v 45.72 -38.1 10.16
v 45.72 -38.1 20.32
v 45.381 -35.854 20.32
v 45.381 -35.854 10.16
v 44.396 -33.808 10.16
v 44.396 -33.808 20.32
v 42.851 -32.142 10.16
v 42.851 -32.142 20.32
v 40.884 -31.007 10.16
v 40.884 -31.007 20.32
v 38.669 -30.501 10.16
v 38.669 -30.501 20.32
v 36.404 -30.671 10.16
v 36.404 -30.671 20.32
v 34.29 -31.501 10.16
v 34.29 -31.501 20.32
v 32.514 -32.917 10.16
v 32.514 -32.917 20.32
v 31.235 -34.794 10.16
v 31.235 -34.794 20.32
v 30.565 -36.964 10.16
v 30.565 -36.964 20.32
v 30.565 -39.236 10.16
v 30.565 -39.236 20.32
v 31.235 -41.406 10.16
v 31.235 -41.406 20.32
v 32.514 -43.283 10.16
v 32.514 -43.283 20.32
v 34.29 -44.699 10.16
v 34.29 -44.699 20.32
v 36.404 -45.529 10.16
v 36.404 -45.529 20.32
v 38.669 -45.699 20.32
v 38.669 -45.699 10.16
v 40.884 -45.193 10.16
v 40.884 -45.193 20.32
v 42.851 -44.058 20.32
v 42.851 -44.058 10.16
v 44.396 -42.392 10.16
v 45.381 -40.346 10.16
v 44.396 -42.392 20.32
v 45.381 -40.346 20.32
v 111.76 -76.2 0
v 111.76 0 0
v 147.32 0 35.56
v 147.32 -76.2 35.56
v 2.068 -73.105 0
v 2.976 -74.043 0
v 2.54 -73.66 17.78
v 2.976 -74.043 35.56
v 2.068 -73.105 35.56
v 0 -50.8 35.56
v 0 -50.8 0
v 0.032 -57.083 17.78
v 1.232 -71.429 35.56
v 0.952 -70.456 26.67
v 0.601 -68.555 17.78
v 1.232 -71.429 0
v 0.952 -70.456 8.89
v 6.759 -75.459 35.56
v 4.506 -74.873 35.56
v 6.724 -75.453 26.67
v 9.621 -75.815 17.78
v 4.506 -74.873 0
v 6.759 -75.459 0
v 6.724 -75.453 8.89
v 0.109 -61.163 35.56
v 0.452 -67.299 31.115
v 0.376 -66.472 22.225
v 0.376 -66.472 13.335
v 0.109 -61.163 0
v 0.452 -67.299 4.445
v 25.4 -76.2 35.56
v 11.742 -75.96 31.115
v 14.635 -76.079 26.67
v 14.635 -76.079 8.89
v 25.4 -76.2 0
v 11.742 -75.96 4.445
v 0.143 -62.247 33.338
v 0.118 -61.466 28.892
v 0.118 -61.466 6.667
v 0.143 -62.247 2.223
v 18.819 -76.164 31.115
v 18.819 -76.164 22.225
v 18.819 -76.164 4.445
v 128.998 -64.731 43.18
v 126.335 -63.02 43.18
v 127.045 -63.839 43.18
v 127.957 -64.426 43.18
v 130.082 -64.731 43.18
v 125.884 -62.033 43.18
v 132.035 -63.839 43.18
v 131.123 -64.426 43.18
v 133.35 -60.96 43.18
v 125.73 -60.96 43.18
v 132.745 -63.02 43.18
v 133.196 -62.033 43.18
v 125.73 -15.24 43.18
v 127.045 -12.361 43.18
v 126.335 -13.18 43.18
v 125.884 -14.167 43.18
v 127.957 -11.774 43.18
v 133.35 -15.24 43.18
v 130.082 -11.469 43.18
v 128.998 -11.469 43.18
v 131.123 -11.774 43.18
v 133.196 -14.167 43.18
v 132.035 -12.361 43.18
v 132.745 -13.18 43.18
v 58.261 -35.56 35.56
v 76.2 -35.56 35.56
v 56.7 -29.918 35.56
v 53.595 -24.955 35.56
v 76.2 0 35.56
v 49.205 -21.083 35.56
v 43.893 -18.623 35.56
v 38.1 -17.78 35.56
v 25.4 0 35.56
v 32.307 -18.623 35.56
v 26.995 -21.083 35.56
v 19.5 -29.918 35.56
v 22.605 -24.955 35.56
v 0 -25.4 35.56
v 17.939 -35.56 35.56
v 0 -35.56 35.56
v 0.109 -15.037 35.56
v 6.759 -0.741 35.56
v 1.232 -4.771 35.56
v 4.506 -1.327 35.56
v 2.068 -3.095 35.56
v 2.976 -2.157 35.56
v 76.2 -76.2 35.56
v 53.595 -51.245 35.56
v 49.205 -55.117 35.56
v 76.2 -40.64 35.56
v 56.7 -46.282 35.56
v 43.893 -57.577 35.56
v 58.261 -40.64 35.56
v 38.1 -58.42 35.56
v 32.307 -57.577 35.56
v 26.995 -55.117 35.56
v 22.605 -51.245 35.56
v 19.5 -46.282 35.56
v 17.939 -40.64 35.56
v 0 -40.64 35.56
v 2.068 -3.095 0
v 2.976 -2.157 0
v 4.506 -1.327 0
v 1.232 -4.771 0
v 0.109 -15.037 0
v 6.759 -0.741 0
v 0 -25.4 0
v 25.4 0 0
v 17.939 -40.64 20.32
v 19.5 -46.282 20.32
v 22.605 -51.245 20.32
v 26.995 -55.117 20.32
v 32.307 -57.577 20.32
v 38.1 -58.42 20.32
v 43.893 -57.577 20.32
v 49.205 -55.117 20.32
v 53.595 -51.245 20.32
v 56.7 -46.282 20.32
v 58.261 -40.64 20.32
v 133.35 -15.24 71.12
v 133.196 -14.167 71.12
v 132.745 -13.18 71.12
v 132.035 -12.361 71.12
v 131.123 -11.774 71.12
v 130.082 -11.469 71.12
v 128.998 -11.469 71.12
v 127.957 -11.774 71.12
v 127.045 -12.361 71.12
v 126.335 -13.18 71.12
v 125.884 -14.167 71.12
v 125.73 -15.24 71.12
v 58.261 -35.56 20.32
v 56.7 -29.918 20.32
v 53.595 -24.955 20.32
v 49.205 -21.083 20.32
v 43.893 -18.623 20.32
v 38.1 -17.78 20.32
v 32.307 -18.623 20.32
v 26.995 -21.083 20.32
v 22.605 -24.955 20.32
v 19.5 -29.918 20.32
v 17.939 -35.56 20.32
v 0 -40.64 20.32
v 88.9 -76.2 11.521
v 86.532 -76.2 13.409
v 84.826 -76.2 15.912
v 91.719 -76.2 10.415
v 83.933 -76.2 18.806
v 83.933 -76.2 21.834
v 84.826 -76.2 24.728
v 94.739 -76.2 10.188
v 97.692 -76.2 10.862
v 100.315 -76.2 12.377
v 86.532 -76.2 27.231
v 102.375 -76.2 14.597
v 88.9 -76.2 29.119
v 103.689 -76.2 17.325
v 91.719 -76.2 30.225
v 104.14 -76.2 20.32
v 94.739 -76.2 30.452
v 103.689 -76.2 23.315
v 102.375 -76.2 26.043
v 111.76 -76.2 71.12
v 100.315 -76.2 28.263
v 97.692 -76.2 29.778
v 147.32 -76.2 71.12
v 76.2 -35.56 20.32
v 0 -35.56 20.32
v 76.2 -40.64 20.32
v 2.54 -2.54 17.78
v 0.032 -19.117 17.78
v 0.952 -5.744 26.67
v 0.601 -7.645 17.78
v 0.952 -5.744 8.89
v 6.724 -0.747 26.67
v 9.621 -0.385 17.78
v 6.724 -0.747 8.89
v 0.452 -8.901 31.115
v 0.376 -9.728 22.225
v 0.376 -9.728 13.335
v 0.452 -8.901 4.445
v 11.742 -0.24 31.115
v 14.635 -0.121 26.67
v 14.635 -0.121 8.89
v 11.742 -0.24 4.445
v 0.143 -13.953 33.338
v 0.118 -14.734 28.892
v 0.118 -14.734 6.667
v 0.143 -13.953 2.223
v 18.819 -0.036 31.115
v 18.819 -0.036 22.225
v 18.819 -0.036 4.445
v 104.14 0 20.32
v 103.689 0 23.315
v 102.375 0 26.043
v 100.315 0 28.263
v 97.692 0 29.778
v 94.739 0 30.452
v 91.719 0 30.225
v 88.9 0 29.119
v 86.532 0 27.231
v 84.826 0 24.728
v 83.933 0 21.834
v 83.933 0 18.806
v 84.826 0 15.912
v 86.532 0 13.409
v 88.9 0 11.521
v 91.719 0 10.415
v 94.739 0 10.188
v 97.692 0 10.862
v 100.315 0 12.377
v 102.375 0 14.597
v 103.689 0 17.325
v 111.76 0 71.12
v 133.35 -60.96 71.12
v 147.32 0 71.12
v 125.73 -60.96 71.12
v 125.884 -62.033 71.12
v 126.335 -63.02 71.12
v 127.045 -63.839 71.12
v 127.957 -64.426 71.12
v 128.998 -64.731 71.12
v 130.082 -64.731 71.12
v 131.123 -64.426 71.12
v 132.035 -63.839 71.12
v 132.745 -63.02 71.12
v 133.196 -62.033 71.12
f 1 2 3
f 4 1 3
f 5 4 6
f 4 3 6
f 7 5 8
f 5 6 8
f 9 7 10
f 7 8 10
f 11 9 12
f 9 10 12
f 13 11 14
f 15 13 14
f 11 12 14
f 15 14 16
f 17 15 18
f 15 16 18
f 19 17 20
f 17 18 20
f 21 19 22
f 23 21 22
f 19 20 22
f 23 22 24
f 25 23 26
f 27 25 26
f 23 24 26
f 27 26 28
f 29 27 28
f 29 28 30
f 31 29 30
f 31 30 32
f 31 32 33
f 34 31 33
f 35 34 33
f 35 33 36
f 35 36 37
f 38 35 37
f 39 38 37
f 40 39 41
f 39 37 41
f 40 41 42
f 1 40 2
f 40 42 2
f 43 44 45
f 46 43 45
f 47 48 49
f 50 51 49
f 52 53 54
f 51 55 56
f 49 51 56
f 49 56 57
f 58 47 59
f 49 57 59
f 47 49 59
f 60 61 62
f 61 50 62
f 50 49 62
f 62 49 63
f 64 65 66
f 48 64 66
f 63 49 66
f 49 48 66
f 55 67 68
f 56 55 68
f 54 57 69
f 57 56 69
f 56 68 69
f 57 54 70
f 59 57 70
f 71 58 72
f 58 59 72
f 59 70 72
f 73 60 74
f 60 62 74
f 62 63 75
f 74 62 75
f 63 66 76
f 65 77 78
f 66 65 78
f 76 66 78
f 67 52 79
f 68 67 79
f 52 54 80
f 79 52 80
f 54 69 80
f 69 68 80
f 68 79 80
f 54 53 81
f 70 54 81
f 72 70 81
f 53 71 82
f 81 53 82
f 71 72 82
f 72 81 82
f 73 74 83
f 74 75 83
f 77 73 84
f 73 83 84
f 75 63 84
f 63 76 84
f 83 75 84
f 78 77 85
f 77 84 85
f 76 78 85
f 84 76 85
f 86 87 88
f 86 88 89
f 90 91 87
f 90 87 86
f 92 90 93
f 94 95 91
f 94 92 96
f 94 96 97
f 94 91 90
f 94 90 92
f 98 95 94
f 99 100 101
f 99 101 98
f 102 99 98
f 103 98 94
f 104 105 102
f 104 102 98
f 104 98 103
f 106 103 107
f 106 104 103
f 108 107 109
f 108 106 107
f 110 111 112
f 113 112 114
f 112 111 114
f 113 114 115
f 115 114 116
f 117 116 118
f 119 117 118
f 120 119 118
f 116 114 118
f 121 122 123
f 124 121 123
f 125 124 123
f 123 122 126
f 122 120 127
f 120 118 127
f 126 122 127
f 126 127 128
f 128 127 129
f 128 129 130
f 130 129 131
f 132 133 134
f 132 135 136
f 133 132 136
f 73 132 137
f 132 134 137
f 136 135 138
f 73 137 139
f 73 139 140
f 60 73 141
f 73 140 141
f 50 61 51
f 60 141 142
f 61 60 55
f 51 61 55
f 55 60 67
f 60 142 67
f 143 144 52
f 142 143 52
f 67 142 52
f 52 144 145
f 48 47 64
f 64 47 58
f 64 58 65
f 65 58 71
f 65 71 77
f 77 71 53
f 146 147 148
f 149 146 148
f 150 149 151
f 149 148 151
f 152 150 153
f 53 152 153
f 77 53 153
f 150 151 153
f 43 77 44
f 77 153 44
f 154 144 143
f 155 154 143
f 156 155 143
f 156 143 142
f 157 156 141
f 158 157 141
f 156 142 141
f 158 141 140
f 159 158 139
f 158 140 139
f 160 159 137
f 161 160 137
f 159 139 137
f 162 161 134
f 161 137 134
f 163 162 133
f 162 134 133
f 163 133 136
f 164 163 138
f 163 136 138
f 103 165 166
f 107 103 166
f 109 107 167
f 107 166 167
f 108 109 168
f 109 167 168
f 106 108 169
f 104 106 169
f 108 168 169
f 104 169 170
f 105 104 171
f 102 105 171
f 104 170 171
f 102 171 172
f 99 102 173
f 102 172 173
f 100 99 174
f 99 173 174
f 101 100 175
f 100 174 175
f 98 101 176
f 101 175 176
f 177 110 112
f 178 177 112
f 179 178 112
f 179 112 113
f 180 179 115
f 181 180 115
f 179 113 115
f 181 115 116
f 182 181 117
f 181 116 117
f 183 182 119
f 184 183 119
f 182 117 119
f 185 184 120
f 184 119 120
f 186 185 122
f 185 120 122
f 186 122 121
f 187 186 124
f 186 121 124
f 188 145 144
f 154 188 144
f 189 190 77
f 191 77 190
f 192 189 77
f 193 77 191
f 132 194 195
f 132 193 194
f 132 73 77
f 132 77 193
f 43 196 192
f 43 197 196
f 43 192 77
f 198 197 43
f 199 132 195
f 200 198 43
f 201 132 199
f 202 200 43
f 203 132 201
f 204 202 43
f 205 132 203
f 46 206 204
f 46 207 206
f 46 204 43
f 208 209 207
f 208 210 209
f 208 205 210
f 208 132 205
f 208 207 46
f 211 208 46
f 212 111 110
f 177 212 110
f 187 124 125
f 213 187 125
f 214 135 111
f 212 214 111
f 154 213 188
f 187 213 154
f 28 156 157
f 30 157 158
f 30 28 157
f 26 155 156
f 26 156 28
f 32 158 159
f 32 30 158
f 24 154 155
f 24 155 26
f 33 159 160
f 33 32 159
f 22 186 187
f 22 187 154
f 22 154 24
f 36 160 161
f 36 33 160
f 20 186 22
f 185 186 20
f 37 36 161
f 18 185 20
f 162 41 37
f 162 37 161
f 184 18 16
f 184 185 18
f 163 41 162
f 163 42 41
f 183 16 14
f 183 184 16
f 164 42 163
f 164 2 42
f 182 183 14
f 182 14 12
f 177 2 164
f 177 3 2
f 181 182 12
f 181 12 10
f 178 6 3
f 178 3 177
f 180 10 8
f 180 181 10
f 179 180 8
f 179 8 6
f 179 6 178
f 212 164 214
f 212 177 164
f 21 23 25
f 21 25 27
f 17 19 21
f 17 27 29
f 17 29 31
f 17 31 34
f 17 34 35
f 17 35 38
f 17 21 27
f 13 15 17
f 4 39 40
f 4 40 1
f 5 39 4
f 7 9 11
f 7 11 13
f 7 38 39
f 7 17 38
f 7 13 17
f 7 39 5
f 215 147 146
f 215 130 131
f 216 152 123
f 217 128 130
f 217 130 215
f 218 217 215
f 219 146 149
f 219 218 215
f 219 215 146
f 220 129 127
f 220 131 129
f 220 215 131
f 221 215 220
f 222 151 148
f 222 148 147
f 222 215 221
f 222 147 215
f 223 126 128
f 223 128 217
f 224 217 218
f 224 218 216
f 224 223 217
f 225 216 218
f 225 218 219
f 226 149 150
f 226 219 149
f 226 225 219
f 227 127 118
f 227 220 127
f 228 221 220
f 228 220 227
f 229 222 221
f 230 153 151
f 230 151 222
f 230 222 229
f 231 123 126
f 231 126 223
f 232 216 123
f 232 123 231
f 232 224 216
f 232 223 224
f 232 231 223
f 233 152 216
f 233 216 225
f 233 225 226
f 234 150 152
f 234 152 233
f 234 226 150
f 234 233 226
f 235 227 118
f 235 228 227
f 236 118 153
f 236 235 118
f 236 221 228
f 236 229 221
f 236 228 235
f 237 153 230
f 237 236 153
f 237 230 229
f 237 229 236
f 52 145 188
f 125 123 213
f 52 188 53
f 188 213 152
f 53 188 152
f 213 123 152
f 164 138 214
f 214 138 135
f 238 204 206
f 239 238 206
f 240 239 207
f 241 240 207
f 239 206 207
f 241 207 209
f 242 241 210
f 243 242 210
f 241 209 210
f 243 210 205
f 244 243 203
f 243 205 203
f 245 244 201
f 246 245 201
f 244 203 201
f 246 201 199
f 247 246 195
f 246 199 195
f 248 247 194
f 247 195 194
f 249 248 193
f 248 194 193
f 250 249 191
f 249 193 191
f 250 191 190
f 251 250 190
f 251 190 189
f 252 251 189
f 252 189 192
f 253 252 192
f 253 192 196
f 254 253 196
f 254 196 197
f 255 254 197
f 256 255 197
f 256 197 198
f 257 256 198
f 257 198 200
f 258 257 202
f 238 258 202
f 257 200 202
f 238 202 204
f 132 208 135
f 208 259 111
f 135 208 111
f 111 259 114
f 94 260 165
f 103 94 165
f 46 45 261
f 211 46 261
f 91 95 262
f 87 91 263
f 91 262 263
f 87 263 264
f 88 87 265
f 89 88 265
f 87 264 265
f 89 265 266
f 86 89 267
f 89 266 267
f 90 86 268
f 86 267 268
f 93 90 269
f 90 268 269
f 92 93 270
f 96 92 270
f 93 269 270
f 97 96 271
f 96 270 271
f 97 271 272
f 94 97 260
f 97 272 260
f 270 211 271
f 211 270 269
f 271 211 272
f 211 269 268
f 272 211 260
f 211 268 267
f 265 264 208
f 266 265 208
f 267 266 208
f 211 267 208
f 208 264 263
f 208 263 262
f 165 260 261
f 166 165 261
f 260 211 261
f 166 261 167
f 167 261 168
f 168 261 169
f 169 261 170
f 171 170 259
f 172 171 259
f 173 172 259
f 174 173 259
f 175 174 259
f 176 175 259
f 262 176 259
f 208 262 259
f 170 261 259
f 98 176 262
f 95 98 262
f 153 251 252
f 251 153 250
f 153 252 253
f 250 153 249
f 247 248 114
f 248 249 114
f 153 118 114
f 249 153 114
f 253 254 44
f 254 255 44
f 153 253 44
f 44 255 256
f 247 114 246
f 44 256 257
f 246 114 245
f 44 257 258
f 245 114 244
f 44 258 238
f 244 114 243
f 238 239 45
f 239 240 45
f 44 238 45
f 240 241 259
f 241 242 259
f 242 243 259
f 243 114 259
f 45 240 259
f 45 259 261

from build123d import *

# Parameters (mm, degrees)
F1_DEPTH     = 76.2
F2_R         = 10.16
F3_DEPTH     = 76.2
F5_DEPTH     = 27.94
F7_DEPTH     = 15.24
F8_R         = 7.62
F9_DEPTH     = 10.16
F10_T1_DEPTH = 162.56
F11_T1_DEPTH = 162.56


# Not quite as in the source:
# - a fillet or chamfer that OpenCascade refuses, or shapes differently, is made with other operations: its cross-section is extruded or revolved along the edge and cut away or added


with BuildPart() as f1:
    # F0 (on Front) → F1 (new body)
    with BuildSketch(Plane.XZ):
        Polygon((0, 35.56), (0, 0), (111.76, 0), (147.32, 35.56), (147.32, 71.12), (111.76, 71.12), (76.2, 35.56), align=None)
    extrude(amount=F1_DEPTH)

    # F2 (on face) → F3 (cut)
    with BuildSketch(Plane.XZ.offset(76.2)):
        with Locations((93.98, 20.32)):
            Circle(F2_R)
    extrude(amount=-F3_DEPTH, mode=Mode.SUBTRACT)

    # F4 (on face) → F5 (cut)
    with BuildSketch(Plane.XY.offset(71.12)):
        with BuildLine():
            ThreePointArc((133.35, -15.24), (129.54, -11.43), (125.73, -15.24))
            Line((125.73, -15.24), (125.73, -60.96))
            ThreePointArc((125.73, -60.96), (129.54, -64.77), (133.35, -60.96))
            Line((133.35, -60.96), (133.35, -15.24))
        make_face()
    extrude(amount=-F5_DEPTH, mode=Mode.SUBTRACT)

    # F6 (on face) → F7 (cut)
    with BuildSketch(Plane.XY.offset(35.56)):
        with BuildLine():
            ThreePointArc((58.2606249903, -40.64), (58.3801171077, -39.3724975829), (58.42, -38.1))
            ThreePointArc((58.42, -38.1), (58.3801171077, -36.8275024171), (58.2606249903, -35.56))
            ThreePointArc((58.2606249903, -35.56), (38.1, -17.78), (17.9393750097, -35.56))
            ThreePointArc((17.9393750097, -35.56), (17.78, -38.1), (17.9393750097, -40.64))
            ThreePointArc((17.9393750097, -40.64), (38.1, -58.42), (58.2606249903, -40.64))
        make_face()
        with BuildLine():
            ThreePointArc((58.2606249903, -35.56), (58.3801171077, -36.8275024171), (58.42, -38.1))
            ThreePointArc((58.42, -38.1), (58.3801171077, -39.3724975829), (58.2606249903, -40.64))
            Line((58.2606249903, -40.64), (76.2, -40.64))
            Line((76.2, -40.64), (76.2, -35.56))
            Line((76.2, -35.56), (58.2606249903, -35.56))
        make_face()
        with BuildLine():
            ThreePointArc((17.9393750097, -40.64), (17.78, -38.1), (17.9393750097, -35.56))
            Line((17.9393750097, -35.56), (0, -35.56))
            Line((0, -35.56), (0, -40.64))
            Line((0, -40.64), (17.9393750097, -40.64))
        make_face()
    extrude(amount=-F7_DEPTH, mode=Mode.SUBTRACT)

    # F8 (on face) → F9 (cut)
    with BuildSketch(Plane.XY.offset(20.32)):
        with Locations((38.1, -38.1)):
            Circle(F8_R)
    extrude(amount=-F9_DEPTH, mode=Mode.SUBTRACT)

    # F10: fillet of radius 25.4 on 1 edges, made by hand

    # F10_s2 → F10_t1 (cut)
    with BuildSketch(Plane.XY.offset(-63.5)):
        with BuildLine():
            add(Edge.make_bspline(
                [(0, -50.8), (0, -76.2), (25.4, -76.2)],
                knots=[0, 0, 0, 1, 1, 1], degree=2, weights=[1, 4, 1]))
            Line((25.4, -76.2), (0, -76.2))
            Line((0, -76.2), (0, -50.8))
        make_face()
    extrude(amount=F10_T1_DEPTH, mode=Mode.SUBTRACT)

    # F11: fillet of radius 25.4 on 1 edges, made by hand

    # F11_s2 → F11_t1 (cut)
    with BuildSketch(Plane.XY.offset(-63.5)):
        with BuildLine():
            add(Edge.make_bspline(
                [(0, -25.4), (0, 0), (25.4, 0)],
                knots=[0, 0, 0, 1, 1, 1], degree=2, weights=[1, 4, 1]))
            Line((25.4, 0), (0, 0))
            Line((0, 0), (0, -25.4))
        make_face()
    extrude(amount=F11_T1_DEPTH, mode=Mode.SUBTRACT)


solid = f1.part
